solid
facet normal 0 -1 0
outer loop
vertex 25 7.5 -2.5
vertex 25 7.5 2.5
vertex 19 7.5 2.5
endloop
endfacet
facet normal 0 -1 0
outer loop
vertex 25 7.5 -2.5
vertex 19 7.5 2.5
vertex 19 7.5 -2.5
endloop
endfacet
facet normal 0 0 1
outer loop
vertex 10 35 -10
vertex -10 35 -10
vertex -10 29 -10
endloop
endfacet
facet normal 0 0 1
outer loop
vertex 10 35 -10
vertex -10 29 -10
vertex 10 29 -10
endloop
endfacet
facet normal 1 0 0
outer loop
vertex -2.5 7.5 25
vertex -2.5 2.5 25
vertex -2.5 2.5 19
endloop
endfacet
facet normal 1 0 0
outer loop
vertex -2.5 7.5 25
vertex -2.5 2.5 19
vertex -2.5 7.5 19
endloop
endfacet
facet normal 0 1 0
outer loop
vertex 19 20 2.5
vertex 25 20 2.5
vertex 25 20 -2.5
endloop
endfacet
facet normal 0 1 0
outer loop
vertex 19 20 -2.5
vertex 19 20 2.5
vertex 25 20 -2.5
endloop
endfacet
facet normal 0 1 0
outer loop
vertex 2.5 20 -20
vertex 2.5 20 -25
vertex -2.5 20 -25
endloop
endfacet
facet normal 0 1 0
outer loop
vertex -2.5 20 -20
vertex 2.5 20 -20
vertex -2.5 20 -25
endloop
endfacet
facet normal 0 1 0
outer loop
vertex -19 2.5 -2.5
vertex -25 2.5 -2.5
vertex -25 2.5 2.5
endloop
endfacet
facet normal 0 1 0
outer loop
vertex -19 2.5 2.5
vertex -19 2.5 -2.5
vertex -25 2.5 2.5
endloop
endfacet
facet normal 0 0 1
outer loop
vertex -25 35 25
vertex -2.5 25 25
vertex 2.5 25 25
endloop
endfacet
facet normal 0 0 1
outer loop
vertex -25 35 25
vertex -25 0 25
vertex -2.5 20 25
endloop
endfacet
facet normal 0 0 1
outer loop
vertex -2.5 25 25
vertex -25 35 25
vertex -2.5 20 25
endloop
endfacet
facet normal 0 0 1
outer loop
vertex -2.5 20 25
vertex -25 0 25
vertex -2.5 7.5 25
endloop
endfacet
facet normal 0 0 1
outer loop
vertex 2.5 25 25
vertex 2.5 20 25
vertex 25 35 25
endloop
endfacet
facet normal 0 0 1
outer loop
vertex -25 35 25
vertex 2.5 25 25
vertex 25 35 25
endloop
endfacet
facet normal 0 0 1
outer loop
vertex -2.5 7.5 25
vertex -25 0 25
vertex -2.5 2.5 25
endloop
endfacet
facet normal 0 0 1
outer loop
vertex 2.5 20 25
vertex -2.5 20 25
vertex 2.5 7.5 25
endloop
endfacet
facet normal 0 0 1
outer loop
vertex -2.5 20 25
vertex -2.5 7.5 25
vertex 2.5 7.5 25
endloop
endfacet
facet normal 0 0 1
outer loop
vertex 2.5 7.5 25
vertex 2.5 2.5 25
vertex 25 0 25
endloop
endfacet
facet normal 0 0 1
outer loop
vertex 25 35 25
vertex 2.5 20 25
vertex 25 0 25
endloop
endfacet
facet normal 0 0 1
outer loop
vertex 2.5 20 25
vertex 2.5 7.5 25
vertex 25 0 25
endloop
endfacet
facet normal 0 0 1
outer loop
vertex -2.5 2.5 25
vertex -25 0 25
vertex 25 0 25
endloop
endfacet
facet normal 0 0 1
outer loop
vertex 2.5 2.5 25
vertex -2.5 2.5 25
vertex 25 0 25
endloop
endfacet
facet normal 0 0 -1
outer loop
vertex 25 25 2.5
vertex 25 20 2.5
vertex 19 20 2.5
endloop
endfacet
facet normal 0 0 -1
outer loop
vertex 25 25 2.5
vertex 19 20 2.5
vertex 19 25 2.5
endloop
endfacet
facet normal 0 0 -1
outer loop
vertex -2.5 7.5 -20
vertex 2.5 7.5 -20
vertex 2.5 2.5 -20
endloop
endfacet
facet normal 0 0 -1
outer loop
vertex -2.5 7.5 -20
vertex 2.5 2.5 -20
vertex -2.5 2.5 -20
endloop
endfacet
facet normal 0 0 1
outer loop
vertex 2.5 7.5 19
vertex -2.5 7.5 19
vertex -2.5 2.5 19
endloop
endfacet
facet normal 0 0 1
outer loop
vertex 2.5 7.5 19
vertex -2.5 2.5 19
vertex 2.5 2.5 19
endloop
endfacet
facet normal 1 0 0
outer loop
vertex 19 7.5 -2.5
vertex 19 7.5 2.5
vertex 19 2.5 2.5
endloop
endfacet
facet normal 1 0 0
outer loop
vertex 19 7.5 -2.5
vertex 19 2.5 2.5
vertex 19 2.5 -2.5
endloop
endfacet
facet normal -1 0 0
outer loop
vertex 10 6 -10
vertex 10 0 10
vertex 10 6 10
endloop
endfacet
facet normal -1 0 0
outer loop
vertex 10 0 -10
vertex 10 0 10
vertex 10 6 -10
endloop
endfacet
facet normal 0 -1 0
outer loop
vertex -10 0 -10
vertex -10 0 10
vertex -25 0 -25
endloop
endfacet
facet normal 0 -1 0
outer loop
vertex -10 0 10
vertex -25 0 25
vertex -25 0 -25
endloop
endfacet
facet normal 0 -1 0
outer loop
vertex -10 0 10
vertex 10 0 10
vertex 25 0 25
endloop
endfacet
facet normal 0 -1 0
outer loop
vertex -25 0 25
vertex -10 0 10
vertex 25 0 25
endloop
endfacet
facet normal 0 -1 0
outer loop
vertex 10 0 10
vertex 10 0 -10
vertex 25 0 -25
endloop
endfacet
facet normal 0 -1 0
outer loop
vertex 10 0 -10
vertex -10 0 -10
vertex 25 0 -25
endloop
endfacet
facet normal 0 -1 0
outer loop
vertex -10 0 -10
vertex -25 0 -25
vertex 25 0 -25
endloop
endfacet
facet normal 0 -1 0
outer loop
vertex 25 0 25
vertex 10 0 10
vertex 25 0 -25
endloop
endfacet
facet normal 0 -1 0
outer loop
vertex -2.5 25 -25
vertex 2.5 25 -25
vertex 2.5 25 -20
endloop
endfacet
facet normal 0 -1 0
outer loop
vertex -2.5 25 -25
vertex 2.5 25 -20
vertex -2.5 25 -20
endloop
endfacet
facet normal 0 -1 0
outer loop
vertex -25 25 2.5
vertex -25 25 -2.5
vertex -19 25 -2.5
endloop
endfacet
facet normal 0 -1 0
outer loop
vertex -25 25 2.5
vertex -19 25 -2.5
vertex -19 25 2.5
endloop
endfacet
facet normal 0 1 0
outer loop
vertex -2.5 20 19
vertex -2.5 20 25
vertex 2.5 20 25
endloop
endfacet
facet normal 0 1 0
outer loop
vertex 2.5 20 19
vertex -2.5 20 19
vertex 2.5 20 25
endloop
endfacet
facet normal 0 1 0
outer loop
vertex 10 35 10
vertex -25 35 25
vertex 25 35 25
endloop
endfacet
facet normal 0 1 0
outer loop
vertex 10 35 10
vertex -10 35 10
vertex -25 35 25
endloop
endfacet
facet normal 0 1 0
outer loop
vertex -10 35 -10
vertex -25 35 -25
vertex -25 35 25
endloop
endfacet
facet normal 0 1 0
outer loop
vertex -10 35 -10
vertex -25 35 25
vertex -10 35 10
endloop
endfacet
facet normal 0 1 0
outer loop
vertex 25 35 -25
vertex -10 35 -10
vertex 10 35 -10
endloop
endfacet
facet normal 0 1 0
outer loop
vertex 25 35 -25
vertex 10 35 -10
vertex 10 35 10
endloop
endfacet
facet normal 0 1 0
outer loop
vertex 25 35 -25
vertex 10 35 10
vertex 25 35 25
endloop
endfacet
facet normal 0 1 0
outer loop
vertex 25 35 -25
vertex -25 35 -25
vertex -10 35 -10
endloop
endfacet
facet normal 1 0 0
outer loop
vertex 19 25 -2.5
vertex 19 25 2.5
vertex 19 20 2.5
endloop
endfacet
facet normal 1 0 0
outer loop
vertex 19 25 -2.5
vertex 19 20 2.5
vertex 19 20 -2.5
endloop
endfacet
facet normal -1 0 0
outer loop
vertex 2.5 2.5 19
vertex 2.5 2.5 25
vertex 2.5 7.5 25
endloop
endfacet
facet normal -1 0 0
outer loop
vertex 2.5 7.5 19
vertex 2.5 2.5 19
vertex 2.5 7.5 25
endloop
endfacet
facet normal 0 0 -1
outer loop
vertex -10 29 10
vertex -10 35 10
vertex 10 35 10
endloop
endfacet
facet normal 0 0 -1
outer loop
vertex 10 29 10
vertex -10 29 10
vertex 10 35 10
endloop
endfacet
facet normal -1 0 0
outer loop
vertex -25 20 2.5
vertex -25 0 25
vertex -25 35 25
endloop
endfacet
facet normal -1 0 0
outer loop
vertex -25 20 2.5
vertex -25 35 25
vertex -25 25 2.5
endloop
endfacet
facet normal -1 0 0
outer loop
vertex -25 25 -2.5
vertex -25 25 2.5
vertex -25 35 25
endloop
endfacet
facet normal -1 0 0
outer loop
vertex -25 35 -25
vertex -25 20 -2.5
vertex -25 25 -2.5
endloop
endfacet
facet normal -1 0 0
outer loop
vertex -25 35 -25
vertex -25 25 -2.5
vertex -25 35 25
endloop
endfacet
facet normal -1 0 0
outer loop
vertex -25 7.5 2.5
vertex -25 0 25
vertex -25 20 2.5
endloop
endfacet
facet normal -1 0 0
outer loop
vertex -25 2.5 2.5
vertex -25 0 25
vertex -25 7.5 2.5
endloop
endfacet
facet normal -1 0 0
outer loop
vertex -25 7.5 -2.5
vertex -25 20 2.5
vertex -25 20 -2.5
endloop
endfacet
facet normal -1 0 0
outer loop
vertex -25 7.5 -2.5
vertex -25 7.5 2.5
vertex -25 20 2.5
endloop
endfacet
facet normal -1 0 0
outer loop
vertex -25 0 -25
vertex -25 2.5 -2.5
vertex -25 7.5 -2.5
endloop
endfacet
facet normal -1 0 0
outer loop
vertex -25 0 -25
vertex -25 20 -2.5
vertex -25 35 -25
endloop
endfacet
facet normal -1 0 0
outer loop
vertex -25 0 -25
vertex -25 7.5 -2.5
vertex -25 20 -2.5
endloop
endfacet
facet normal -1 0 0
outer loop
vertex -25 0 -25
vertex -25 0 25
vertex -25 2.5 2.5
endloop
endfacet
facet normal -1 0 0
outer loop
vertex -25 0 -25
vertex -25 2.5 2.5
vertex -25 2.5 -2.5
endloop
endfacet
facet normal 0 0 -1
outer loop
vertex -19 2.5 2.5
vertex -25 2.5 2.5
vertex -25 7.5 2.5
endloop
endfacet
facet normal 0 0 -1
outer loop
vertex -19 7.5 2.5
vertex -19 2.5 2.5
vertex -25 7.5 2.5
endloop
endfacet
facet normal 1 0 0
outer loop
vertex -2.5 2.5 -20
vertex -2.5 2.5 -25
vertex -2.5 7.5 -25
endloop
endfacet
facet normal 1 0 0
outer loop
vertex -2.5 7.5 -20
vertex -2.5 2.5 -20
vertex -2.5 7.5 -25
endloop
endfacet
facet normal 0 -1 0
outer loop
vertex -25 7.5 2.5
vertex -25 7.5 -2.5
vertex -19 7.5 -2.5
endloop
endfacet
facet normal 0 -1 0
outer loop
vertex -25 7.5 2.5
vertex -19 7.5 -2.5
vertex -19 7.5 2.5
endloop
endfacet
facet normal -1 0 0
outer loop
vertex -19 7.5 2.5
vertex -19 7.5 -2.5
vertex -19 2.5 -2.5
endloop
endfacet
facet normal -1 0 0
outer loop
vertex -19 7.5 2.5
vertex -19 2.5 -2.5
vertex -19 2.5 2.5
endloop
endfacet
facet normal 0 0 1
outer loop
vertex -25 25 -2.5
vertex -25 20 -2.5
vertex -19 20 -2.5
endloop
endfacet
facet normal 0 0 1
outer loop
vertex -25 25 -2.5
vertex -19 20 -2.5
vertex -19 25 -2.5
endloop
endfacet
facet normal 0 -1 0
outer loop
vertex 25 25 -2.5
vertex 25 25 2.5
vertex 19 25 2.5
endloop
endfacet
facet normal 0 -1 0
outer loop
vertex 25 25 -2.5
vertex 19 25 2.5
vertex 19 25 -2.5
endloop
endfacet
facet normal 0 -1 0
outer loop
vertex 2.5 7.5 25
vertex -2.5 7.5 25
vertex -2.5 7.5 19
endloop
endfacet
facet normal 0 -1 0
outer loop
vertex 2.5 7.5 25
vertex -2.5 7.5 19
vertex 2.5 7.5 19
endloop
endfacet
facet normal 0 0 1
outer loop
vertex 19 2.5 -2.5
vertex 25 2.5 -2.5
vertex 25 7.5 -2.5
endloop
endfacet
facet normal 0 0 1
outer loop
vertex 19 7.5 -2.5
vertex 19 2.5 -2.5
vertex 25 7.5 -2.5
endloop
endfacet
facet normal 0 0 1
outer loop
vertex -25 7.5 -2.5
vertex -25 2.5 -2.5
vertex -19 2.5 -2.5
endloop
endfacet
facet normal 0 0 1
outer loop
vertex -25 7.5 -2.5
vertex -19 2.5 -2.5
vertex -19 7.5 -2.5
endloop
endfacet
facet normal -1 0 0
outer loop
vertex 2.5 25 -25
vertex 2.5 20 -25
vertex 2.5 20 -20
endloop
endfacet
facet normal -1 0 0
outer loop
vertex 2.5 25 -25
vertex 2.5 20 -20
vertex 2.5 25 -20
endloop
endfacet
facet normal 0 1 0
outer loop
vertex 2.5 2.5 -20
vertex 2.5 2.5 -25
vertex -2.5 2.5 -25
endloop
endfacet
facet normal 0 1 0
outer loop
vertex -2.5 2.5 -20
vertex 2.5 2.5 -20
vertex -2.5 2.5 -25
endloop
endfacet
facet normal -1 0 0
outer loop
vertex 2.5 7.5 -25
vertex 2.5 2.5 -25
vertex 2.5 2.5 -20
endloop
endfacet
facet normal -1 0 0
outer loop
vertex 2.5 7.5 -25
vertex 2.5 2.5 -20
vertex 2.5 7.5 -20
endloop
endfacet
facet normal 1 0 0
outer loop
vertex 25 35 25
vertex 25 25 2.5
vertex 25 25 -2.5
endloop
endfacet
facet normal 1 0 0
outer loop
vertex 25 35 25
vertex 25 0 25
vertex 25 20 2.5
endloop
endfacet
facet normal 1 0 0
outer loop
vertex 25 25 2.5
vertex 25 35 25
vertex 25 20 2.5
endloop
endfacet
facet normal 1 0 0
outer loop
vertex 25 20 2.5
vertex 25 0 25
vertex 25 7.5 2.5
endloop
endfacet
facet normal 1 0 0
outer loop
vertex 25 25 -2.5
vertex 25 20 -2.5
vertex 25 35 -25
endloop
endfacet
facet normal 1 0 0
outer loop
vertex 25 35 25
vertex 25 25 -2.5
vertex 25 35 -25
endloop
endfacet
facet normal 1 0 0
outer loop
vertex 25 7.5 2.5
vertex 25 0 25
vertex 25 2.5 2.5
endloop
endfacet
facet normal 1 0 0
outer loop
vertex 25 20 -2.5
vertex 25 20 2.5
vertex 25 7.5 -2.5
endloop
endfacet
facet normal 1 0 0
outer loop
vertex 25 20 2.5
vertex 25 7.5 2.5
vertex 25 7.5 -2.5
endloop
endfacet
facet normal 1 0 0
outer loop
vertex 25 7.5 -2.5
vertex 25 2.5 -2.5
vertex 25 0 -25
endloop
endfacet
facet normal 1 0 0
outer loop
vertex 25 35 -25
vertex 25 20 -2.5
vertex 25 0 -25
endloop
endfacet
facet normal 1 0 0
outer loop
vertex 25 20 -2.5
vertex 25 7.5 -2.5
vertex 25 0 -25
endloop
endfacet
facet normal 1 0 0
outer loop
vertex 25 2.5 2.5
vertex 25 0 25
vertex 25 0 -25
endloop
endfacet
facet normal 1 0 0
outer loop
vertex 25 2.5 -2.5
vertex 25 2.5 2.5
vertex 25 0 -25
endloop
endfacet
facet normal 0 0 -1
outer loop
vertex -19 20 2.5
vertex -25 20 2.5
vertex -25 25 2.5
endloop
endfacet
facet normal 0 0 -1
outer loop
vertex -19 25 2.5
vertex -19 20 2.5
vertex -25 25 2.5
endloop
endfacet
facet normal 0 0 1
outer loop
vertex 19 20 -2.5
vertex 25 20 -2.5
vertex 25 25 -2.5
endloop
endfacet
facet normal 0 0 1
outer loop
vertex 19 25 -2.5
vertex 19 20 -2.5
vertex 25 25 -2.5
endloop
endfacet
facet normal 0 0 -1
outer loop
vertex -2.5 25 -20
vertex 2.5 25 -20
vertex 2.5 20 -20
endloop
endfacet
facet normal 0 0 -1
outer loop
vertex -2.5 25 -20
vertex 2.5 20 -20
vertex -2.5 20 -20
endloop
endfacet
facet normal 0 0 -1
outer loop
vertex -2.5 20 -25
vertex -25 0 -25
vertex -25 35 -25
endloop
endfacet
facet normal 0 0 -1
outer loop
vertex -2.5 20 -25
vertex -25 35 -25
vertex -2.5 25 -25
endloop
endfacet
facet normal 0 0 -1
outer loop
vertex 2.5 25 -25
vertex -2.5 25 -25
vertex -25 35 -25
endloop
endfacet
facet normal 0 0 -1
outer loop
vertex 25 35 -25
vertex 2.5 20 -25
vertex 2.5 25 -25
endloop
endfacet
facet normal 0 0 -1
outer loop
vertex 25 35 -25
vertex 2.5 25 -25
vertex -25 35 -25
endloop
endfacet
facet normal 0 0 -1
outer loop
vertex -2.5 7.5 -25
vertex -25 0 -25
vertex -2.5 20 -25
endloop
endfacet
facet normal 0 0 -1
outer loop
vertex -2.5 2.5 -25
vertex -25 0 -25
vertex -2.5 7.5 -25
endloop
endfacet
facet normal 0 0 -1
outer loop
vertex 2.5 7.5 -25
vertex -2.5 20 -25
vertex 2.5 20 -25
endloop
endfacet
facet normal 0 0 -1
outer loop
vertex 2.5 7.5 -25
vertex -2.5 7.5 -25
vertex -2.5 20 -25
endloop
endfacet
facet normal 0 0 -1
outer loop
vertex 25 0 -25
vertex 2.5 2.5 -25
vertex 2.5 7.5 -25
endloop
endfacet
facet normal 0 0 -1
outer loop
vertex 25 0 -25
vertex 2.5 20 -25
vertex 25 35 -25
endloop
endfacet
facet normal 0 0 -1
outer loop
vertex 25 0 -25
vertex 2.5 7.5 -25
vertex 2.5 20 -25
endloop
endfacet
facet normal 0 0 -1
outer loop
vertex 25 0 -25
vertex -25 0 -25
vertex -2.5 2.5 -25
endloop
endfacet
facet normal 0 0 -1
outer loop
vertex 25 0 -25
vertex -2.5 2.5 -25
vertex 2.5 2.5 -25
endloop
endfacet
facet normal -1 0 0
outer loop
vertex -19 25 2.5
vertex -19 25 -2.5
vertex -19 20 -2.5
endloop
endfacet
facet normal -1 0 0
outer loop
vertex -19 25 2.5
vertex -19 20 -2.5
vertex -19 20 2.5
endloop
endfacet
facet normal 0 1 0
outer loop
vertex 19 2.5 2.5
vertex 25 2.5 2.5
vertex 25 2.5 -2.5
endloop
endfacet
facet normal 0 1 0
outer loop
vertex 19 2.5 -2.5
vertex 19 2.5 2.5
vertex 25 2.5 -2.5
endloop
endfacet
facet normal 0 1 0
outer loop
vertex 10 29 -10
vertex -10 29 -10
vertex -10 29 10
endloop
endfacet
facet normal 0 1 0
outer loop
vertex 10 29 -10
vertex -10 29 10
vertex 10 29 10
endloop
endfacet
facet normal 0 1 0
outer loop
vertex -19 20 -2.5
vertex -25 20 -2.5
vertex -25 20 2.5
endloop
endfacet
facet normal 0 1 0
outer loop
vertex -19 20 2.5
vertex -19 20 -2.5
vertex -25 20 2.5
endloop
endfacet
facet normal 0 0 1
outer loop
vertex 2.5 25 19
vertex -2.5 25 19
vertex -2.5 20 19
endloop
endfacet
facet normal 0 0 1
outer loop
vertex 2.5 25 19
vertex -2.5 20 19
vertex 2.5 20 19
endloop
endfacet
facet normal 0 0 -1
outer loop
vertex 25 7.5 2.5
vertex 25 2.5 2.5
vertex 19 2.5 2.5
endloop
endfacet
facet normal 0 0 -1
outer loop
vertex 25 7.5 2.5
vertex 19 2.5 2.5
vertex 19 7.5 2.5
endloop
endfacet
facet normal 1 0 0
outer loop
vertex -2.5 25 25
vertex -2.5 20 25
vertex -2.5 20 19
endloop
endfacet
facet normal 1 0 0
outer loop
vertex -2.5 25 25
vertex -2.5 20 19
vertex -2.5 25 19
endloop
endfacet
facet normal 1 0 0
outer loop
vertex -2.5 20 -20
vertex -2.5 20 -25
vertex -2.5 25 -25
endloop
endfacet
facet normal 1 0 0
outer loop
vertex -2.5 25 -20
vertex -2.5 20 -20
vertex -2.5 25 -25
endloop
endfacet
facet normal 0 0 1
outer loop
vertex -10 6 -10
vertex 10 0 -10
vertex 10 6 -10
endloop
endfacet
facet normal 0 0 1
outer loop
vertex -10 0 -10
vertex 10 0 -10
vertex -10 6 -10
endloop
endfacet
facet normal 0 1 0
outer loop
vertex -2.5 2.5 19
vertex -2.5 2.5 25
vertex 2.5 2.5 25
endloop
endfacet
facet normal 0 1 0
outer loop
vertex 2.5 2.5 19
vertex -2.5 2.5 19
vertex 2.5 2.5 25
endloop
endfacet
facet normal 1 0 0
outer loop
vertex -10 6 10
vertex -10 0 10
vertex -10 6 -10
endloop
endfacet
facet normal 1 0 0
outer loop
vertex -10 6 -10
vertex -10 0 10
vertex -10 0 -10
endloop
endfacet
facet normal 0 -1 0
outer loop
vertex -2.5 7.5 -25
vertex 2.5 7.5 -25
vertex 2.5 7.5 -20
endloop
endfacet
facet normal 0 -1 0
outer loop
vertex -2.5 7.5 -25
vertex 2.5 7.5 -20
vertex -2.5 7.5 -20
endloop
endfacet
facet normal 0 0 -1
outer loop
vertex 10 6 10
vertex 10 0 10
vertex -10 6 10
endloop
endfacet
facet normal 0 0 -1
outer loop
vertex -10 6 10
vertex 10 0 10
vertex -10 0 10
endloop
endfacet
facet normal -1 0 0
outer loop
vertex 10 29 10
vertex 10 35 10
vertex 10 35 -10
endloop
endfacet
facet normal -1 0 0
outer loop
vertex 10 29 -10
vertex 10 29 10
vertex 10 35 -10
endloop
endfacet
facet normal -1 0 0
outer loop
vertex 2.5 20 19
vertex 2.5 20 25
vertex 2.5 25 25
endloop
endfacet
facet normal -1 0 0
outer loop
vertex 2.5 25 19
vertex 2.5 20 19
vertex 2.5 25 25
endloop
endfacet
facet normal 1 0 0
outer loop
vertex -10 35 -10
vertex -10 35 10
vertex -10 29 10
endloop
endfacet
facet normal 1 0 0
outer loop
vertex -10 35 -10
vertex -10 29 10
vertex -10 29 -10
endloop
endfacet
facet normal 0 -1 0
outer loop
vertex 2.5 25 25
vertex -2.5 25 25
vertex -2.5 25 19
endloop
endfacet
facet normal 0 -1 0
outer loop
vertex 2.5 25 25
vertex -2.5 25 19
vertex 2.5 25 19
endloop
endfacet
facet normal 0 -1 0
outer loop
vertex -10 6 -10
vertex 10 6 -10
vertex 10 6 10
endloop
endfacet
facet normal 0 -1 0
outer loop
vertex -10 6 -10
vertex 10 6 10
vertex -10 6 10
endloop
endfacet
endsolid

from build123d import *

# Parameters (mm, degrees)
SKETCH1_W           = 50
SKETCH1_H           = 50
BOSS_EXTRUDE1_DEPTH = 35
SKETCH3_W           = 5
SKETCH3_H           = 5
CUT_EXTRUDE2_DEPTH  = 6
SKETCH4_W           = 5
SKETCH4_H           = 5
CUT_EXTRUDE3_DEPTH  = 5
SKETCH5_W           = 5
SKETCH5_H           = 5
CUT_EXTRUDE4_DEPTH  = 6
SKETCH6_W           = 5
SKETCH6_H           = 5
CUT_EXTRUDE5_DEPTH  = 6
SKETCH7_W           = 20
SKETCH7_H           = 20
CUT_EXTRUDE6_DEPTH  = 6
SKETCH8_W           = 20
SKETCH8_H           = 20
CUT_EXTRUDE7_DEPTH  = 6


with BuildPart() as part:
    # Sketch1 → Boss-Extrude1 (new body)
    with BuildSketch(Plane(origin=(0, 0, 0), x_dir=(1, 0, 0), z_dir=(0, 1, 0))):
        Rectangle(SKETCH1_W, SKETCH1_H)
    extrude(amount=BOSS_EXTRUDE1_DEPTH)

    # Sketch3 → Cut-Extrude2 (cut)
    with BuildSketch(Plane.ZY.offset(25)):
        with Locations((0, 5)):
            Rectangle(SKETCH3_W, SKETCH3_H)
        with Locations((0, 22.5)):
            Rectangle(SKETCH3_W, SKETCH3_H)
    extrude(amount=-CUT_EXTRUDE2_DEPTH, mode=Mode.SUBTRACT)

    # Sketch4 → Cut-Extrude3 (cut)
    with BuildSketch(Plane(origin=(0, 0, -25), x_dir=(-1, 0, 0), z_dir=(0, 0, -1))):
        with Locations((0, 5)):
            Rectangle(SKETCH4_W, SKETCH4_H)
        with Locations((0, 22.5)):
            Rectangle(SKETCH4_W, SKETCH4_H)
    extrude(amount=-CUT_EXTRUDE3_DEPTH, mode=Mode.SUBTRACT)

    # Sketch5 → Cut-Extrude4 (cut)
    with BuildSketch(Plane(origin=(25, 0, 0), x_dir=(0, 0, -1), z_dir=(1, 0, 0))):
        with Locations((0, 5)):
            Rectangle(SKETCH5_W, SKETCH5_H)
        with Locations((0, 22.5)):
            Rectangle(SKETCH5_W, SKETCH5_H)
    extrude(amount=-CUT_EXTRUDE4_DEPTH, mode=Mode.SUBTRACT)

    # Sketch6 → Cut-Extrude5 (cut)
    with BuildSketch(Plane.XY.offset(25)):
        with Locations((0, 5)):
            Rectangle(SKETCH6_W, SKETCH6_H)
        with Locations((0, 22.5)):
            Rectangle(SKETCH6_W, SKETCH6_H)
    extrude(amount=-CUT_EXTRUDE5_DEPTH, mode=Mode.SUBTRACT)

    # Sketch7 → Cut-Extrude6 (cut)
    with BuildSketch(Plane(origin=(0, 0, 0), x_dir=(-1, 0, 0), z_dir=(0, -1, 0))):
        Rectangle(SKETCH7_W, SKETCH7_H)
    extrude(amount=-CUT_EXTRUDE6_DEPTH, mode=Mode.SUBTRACT)

    # Sketch8 → Cut-Extrude7 (cut)
    with BuildSketch(Plane(origin=(0, 35, 0), x_dir=(1, 0, 0), z_dir=(0, 1, 0))):
        Rectangle(SKETCH8_W, SKETCH8_H)
    extrude(amount=-CUT_EXTRUDE7_DEPTH, mode=Mode.SUBTRACT)


solid = part.part
